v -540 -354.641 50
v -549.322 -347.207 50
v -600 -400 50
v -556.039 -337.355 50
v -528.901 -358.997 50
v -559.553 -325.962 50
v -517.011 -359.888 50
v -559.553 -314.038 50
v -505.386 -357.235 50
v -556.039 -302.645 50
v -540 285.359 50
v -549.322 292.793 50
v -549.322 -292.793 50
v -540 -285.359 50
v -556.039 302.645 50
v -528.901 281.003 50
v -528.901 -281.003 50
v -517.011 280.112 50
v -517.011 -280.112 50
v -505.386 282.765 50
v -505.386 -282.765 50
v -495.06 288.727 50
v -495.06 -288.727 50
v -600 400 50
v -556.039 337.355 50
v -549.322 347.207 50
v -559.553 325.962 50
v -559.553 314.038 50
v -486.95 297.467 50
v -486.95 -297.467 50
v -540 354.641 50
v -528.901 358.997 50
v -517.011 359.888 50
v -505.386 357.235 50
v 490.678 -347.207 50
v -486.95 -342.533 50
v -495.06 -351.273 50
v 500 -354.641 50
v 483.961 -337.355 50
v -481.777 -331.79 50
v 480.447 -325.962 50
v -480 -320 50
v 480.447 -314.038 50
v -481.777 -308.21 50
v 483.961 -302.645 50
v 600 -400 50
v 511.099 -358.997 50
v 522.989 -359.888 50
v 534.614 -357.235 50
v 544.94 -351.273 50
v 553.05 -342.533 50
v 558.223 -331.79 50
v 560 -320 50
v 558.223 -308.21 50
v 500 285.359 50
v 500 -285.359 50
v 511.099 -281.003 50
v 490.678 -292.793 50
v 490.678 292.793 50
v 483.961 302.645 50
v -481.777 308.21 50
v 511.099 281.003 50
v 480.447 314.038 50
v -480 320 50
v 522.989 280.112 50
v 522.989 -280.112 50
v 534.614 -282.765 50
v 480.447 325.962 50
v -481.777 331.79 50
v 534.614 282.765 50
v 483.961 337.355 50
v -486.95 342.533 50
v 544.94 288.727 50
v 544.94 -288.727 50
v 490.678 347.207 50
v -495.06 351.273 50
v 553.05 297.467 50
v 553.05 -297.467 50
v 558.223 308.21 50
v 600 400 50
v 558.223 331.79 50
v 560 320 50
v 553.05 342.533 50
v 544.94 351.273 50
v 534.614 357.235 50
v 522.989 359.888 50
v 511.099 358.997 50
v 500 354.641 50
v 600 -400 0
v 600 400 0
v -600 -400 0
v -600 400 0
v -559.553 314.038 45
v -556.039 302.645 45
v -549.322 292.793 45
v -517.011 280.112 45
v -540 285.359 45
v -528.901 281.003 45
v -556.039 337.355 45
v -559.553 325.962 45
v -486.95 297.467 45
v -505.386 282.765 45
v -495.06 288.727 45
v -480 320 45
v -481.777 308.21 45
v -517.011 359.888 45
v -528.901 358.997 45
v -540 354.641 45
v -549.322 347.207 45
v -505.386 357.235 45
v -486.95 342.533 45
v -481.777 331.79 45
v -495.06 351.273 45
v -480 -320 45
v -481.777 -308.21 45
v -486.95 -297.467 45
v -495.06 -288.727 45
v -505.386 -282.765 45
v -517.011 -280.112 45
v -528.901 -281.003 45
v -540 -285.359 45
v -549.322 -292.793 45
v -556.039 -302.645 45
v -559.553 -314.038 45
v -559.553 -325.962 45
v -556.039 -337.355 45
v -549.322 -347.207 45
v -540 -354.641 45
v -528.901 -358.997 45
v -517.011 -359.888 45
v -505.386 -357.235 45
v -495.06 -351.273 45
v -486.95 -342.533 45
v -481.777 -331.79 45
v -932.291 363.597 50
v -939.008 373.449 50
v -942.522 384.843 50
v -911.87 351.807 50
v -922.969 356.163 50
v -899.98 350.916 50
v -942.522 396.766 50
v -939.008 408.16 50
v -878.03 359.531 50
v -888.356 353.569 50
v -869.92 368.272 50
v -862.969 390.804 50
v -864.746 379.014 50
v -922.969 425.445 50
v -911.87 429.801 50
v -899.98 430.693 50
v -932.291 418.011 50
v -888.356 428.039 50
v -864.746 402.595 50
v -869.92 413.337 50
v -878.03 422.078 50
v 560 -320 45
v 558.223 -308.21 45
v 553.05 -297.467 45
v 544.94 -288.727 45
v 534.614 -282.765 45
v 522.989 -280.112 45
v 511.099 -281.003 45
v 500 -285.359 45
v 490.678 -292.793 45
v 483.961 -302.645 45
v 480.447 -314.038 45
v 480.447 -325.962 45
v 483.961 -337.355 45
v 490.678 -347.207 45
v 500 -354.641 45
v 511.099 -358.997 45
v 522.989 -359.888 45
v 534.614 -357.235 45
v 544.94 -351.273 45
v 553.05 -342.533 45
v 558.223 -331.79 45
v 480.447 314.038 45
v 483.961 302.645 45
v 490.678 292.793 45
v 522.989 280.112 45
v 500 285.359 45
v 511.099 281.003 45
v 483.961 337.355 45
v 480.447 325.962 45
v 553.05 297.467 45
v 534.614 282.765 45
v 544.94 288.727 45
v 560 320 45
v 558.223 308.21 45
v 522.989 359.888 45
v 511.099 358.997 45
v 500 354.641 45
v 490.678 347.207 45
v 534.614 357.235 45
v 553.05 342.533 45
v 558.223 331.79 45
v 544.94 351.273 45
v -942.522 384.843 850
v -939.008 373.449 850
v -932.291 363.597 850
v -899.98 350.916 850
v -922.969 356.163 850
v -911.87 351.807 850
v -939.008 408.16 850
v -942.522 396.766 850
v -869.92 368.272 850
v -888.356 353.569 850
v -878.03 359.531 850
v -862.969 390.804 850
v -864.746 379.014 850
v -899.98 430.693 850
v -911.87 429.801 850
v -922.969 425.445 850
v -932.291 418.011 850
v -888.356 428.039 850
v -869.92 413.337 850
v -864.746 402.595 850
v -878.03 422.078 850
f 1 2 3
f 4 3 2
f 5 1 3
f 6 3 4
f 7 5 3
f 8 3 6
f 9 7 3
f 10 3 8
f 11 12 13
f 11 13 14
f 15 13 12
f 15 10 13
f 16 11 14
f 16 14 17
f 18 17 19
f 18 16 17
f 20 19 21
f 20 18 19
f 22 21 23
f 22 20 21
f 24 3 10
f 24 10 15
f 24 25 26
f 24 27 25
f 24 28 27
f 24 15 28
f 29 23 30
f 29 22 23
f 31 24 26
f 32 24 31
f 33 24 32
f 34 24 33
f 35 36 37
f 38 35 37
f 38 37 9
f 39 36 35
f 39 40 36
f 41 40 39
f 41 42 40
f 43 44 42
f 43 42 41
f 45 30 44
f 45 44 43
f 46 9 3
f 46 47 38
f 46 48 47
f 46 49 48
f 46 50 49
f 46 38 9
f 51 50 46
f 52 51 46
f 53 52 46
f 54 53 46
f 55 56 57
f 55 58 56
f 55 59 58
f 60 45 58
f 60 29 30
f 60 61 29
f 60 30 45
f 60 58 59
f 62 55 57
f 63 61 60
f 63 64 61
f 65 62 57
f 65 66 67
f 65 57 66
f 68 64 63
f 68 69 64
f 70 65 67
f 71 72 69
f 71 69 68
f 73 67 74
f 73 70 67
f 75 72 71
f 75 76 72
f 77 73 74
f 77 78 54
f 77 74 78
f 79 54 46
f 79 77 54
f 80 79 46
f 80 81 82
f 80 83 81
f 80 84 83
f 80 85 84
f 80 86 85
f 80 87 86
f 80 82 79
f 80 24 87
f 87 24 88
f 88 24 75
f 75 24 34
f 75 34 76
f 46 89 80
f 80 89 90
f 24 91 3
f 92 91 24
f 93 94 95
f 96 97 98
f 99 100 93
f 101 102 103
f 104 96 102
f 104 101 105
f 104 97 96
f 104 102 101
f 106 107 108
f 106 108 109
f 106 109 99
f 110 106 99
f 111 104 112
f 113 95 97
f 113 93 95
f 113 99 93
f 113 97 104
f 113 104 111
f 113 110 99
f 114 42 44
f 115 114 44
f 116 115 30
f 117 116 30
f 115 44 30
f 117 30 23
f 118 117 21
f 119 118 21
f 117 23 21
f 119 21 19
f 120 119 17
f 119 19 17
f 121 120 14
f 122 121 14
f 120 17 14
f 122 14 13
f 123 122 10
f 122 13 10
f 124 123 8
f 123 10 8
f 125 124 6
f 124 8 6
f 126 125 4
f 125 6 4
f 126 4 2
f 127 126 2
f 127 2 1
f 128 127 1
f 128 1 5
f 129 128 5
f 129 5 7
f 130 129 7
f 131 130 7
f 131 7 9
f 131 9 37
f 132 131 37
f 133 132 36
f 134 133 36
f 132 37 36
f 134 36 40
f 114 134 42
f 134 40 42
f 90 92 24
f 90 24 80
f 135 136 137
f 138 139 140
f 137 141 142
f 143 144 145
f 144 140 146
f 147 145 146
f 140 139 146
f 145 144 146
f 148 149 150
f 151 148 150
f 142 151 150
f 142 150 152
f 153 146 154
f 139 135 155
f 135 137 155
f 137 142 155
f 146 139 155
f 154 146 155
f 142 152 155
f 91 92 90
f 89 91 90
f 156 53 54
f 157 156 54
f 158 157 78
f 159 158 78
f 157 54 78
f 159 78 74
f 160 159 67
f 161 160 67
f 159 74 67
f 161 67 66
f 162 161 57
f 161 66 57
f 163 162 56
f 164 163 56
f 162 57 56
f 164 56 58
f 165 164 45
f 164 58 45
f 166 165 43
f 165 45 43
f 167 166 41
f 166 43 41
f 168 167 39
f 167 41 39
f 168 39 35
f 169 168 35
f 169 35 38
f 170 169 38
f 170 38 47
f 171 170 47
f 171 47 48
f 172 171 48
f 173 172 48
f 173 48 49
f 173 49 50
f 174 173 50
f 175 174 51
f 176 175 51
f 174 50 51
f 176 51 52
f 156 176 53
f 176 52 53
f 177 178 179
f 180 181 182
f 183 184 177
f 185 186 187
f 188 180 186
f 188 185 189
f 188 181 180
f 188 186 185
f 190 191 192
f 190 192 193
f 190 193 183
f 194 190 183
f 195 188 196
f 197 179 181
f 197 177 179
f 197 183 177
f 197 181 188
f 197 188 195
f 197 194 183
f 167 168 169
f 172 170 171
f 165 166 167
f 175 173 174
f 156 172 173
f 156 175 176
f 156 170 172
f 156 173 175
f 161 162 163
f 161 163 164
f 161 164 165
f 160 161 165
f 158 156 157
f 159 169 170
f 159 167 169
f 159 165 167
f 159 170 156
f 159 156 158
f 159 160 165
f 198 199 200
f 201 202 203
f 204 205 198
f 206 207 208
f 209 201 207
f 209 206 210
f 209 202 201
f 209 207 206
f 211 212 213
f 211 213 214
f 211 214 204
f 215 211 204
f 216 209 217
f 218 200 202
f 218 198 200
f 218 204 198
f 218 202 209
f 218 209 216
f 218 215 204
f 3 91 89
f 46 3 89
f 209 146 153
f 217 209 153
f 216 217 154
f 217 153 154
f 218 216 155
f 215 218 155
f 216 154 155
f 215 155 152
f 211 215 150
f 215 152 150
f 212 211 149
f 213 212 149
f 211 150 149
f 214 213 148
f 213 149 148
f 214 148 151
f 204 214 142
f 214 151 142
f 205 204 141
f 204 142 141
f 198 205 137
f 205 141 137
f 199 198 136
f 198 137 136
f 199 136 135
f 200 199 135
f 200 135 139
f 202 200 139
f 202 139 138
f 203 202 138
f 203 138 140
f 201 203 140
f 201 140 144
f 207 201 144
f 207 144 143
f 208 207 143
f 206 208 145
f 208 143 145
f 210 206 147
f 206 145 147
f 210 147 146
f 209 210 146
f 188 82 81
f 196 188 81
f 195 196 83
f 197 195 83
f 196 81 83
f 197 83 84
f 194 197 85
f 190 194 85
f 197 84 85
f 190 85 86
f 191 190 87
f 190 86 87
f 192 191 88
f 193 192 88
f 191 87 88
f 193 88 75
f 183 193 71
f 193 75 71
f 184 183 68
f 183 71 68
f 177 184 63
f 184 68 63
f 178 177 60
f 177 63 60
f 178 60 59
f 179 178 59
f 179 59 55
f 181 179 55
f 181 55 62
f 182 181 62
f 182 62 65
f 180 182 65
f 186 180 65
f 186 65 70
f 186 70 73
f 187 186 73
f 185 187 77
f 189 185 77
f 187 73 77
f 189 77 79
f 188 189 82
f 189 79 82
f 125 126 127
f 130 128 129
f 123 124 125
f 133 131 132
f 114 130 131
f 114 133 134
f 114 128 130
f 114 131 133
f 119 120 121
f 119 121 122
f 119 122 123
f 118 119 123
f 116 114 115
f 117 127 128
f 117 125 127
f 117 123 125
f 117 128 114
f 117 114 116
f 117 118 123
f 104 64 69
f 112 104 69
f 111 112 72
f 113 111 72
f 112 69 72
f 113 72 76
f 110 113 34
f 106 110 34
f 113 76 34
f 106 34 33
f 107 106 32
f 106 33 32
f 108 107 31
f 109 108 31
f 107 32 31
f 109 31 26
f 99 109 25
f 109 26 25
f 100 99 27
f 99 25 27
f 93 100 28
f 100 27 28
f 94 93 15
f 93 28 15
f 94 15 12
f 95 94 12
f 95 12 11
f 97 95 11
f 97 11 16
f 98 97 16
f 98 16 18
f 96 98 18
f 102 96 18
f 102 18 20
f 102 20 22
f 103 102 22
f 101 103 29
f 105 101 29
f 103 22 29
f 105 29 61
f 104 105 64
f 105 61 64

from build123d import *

# Parameters (mm, degrees)
F0_W     = 1200
F0_H     = 800
F1_DEPTH = 50
F2_R     = 40
F3_DEPTH = 800
F4_R     = 40
F5_DEPTH = 5


with BuildPart() as f1:
    # F0 (on Top) → F1 (new body)
    with BuildSketch(Plane.XY):
        Rectangle(F0_W, F0_H)
    extrude(amount=F1_DEPTH)

    # F4 (on face) → F5 (cut)
    with BuildSketch(Plane.XY.offset(50)):
        with Locations((-520, 320)):
            Circle(F4_R)
        with Locations((-520, -320)):
            Circle(F4_R)
        with Locations((520, 320)):
            Circle(F4_R)
        with Locations((520, -320)):
            Circle(F4_R)
    extrude(amount=-F5_DEPTH, mode=Mode.SUBTRACT)


with BuildPart() as f3:
    # F2 (on face) → F3 (new body)
    with BuildSketch(Plane.XY.offset(50)):
        with Locations((-902.969241, 390.80438)):
            Circle(F2_R)
    extrude(amount=F3_DEPTH)


solid = Compound([f1.part, f3.part])
